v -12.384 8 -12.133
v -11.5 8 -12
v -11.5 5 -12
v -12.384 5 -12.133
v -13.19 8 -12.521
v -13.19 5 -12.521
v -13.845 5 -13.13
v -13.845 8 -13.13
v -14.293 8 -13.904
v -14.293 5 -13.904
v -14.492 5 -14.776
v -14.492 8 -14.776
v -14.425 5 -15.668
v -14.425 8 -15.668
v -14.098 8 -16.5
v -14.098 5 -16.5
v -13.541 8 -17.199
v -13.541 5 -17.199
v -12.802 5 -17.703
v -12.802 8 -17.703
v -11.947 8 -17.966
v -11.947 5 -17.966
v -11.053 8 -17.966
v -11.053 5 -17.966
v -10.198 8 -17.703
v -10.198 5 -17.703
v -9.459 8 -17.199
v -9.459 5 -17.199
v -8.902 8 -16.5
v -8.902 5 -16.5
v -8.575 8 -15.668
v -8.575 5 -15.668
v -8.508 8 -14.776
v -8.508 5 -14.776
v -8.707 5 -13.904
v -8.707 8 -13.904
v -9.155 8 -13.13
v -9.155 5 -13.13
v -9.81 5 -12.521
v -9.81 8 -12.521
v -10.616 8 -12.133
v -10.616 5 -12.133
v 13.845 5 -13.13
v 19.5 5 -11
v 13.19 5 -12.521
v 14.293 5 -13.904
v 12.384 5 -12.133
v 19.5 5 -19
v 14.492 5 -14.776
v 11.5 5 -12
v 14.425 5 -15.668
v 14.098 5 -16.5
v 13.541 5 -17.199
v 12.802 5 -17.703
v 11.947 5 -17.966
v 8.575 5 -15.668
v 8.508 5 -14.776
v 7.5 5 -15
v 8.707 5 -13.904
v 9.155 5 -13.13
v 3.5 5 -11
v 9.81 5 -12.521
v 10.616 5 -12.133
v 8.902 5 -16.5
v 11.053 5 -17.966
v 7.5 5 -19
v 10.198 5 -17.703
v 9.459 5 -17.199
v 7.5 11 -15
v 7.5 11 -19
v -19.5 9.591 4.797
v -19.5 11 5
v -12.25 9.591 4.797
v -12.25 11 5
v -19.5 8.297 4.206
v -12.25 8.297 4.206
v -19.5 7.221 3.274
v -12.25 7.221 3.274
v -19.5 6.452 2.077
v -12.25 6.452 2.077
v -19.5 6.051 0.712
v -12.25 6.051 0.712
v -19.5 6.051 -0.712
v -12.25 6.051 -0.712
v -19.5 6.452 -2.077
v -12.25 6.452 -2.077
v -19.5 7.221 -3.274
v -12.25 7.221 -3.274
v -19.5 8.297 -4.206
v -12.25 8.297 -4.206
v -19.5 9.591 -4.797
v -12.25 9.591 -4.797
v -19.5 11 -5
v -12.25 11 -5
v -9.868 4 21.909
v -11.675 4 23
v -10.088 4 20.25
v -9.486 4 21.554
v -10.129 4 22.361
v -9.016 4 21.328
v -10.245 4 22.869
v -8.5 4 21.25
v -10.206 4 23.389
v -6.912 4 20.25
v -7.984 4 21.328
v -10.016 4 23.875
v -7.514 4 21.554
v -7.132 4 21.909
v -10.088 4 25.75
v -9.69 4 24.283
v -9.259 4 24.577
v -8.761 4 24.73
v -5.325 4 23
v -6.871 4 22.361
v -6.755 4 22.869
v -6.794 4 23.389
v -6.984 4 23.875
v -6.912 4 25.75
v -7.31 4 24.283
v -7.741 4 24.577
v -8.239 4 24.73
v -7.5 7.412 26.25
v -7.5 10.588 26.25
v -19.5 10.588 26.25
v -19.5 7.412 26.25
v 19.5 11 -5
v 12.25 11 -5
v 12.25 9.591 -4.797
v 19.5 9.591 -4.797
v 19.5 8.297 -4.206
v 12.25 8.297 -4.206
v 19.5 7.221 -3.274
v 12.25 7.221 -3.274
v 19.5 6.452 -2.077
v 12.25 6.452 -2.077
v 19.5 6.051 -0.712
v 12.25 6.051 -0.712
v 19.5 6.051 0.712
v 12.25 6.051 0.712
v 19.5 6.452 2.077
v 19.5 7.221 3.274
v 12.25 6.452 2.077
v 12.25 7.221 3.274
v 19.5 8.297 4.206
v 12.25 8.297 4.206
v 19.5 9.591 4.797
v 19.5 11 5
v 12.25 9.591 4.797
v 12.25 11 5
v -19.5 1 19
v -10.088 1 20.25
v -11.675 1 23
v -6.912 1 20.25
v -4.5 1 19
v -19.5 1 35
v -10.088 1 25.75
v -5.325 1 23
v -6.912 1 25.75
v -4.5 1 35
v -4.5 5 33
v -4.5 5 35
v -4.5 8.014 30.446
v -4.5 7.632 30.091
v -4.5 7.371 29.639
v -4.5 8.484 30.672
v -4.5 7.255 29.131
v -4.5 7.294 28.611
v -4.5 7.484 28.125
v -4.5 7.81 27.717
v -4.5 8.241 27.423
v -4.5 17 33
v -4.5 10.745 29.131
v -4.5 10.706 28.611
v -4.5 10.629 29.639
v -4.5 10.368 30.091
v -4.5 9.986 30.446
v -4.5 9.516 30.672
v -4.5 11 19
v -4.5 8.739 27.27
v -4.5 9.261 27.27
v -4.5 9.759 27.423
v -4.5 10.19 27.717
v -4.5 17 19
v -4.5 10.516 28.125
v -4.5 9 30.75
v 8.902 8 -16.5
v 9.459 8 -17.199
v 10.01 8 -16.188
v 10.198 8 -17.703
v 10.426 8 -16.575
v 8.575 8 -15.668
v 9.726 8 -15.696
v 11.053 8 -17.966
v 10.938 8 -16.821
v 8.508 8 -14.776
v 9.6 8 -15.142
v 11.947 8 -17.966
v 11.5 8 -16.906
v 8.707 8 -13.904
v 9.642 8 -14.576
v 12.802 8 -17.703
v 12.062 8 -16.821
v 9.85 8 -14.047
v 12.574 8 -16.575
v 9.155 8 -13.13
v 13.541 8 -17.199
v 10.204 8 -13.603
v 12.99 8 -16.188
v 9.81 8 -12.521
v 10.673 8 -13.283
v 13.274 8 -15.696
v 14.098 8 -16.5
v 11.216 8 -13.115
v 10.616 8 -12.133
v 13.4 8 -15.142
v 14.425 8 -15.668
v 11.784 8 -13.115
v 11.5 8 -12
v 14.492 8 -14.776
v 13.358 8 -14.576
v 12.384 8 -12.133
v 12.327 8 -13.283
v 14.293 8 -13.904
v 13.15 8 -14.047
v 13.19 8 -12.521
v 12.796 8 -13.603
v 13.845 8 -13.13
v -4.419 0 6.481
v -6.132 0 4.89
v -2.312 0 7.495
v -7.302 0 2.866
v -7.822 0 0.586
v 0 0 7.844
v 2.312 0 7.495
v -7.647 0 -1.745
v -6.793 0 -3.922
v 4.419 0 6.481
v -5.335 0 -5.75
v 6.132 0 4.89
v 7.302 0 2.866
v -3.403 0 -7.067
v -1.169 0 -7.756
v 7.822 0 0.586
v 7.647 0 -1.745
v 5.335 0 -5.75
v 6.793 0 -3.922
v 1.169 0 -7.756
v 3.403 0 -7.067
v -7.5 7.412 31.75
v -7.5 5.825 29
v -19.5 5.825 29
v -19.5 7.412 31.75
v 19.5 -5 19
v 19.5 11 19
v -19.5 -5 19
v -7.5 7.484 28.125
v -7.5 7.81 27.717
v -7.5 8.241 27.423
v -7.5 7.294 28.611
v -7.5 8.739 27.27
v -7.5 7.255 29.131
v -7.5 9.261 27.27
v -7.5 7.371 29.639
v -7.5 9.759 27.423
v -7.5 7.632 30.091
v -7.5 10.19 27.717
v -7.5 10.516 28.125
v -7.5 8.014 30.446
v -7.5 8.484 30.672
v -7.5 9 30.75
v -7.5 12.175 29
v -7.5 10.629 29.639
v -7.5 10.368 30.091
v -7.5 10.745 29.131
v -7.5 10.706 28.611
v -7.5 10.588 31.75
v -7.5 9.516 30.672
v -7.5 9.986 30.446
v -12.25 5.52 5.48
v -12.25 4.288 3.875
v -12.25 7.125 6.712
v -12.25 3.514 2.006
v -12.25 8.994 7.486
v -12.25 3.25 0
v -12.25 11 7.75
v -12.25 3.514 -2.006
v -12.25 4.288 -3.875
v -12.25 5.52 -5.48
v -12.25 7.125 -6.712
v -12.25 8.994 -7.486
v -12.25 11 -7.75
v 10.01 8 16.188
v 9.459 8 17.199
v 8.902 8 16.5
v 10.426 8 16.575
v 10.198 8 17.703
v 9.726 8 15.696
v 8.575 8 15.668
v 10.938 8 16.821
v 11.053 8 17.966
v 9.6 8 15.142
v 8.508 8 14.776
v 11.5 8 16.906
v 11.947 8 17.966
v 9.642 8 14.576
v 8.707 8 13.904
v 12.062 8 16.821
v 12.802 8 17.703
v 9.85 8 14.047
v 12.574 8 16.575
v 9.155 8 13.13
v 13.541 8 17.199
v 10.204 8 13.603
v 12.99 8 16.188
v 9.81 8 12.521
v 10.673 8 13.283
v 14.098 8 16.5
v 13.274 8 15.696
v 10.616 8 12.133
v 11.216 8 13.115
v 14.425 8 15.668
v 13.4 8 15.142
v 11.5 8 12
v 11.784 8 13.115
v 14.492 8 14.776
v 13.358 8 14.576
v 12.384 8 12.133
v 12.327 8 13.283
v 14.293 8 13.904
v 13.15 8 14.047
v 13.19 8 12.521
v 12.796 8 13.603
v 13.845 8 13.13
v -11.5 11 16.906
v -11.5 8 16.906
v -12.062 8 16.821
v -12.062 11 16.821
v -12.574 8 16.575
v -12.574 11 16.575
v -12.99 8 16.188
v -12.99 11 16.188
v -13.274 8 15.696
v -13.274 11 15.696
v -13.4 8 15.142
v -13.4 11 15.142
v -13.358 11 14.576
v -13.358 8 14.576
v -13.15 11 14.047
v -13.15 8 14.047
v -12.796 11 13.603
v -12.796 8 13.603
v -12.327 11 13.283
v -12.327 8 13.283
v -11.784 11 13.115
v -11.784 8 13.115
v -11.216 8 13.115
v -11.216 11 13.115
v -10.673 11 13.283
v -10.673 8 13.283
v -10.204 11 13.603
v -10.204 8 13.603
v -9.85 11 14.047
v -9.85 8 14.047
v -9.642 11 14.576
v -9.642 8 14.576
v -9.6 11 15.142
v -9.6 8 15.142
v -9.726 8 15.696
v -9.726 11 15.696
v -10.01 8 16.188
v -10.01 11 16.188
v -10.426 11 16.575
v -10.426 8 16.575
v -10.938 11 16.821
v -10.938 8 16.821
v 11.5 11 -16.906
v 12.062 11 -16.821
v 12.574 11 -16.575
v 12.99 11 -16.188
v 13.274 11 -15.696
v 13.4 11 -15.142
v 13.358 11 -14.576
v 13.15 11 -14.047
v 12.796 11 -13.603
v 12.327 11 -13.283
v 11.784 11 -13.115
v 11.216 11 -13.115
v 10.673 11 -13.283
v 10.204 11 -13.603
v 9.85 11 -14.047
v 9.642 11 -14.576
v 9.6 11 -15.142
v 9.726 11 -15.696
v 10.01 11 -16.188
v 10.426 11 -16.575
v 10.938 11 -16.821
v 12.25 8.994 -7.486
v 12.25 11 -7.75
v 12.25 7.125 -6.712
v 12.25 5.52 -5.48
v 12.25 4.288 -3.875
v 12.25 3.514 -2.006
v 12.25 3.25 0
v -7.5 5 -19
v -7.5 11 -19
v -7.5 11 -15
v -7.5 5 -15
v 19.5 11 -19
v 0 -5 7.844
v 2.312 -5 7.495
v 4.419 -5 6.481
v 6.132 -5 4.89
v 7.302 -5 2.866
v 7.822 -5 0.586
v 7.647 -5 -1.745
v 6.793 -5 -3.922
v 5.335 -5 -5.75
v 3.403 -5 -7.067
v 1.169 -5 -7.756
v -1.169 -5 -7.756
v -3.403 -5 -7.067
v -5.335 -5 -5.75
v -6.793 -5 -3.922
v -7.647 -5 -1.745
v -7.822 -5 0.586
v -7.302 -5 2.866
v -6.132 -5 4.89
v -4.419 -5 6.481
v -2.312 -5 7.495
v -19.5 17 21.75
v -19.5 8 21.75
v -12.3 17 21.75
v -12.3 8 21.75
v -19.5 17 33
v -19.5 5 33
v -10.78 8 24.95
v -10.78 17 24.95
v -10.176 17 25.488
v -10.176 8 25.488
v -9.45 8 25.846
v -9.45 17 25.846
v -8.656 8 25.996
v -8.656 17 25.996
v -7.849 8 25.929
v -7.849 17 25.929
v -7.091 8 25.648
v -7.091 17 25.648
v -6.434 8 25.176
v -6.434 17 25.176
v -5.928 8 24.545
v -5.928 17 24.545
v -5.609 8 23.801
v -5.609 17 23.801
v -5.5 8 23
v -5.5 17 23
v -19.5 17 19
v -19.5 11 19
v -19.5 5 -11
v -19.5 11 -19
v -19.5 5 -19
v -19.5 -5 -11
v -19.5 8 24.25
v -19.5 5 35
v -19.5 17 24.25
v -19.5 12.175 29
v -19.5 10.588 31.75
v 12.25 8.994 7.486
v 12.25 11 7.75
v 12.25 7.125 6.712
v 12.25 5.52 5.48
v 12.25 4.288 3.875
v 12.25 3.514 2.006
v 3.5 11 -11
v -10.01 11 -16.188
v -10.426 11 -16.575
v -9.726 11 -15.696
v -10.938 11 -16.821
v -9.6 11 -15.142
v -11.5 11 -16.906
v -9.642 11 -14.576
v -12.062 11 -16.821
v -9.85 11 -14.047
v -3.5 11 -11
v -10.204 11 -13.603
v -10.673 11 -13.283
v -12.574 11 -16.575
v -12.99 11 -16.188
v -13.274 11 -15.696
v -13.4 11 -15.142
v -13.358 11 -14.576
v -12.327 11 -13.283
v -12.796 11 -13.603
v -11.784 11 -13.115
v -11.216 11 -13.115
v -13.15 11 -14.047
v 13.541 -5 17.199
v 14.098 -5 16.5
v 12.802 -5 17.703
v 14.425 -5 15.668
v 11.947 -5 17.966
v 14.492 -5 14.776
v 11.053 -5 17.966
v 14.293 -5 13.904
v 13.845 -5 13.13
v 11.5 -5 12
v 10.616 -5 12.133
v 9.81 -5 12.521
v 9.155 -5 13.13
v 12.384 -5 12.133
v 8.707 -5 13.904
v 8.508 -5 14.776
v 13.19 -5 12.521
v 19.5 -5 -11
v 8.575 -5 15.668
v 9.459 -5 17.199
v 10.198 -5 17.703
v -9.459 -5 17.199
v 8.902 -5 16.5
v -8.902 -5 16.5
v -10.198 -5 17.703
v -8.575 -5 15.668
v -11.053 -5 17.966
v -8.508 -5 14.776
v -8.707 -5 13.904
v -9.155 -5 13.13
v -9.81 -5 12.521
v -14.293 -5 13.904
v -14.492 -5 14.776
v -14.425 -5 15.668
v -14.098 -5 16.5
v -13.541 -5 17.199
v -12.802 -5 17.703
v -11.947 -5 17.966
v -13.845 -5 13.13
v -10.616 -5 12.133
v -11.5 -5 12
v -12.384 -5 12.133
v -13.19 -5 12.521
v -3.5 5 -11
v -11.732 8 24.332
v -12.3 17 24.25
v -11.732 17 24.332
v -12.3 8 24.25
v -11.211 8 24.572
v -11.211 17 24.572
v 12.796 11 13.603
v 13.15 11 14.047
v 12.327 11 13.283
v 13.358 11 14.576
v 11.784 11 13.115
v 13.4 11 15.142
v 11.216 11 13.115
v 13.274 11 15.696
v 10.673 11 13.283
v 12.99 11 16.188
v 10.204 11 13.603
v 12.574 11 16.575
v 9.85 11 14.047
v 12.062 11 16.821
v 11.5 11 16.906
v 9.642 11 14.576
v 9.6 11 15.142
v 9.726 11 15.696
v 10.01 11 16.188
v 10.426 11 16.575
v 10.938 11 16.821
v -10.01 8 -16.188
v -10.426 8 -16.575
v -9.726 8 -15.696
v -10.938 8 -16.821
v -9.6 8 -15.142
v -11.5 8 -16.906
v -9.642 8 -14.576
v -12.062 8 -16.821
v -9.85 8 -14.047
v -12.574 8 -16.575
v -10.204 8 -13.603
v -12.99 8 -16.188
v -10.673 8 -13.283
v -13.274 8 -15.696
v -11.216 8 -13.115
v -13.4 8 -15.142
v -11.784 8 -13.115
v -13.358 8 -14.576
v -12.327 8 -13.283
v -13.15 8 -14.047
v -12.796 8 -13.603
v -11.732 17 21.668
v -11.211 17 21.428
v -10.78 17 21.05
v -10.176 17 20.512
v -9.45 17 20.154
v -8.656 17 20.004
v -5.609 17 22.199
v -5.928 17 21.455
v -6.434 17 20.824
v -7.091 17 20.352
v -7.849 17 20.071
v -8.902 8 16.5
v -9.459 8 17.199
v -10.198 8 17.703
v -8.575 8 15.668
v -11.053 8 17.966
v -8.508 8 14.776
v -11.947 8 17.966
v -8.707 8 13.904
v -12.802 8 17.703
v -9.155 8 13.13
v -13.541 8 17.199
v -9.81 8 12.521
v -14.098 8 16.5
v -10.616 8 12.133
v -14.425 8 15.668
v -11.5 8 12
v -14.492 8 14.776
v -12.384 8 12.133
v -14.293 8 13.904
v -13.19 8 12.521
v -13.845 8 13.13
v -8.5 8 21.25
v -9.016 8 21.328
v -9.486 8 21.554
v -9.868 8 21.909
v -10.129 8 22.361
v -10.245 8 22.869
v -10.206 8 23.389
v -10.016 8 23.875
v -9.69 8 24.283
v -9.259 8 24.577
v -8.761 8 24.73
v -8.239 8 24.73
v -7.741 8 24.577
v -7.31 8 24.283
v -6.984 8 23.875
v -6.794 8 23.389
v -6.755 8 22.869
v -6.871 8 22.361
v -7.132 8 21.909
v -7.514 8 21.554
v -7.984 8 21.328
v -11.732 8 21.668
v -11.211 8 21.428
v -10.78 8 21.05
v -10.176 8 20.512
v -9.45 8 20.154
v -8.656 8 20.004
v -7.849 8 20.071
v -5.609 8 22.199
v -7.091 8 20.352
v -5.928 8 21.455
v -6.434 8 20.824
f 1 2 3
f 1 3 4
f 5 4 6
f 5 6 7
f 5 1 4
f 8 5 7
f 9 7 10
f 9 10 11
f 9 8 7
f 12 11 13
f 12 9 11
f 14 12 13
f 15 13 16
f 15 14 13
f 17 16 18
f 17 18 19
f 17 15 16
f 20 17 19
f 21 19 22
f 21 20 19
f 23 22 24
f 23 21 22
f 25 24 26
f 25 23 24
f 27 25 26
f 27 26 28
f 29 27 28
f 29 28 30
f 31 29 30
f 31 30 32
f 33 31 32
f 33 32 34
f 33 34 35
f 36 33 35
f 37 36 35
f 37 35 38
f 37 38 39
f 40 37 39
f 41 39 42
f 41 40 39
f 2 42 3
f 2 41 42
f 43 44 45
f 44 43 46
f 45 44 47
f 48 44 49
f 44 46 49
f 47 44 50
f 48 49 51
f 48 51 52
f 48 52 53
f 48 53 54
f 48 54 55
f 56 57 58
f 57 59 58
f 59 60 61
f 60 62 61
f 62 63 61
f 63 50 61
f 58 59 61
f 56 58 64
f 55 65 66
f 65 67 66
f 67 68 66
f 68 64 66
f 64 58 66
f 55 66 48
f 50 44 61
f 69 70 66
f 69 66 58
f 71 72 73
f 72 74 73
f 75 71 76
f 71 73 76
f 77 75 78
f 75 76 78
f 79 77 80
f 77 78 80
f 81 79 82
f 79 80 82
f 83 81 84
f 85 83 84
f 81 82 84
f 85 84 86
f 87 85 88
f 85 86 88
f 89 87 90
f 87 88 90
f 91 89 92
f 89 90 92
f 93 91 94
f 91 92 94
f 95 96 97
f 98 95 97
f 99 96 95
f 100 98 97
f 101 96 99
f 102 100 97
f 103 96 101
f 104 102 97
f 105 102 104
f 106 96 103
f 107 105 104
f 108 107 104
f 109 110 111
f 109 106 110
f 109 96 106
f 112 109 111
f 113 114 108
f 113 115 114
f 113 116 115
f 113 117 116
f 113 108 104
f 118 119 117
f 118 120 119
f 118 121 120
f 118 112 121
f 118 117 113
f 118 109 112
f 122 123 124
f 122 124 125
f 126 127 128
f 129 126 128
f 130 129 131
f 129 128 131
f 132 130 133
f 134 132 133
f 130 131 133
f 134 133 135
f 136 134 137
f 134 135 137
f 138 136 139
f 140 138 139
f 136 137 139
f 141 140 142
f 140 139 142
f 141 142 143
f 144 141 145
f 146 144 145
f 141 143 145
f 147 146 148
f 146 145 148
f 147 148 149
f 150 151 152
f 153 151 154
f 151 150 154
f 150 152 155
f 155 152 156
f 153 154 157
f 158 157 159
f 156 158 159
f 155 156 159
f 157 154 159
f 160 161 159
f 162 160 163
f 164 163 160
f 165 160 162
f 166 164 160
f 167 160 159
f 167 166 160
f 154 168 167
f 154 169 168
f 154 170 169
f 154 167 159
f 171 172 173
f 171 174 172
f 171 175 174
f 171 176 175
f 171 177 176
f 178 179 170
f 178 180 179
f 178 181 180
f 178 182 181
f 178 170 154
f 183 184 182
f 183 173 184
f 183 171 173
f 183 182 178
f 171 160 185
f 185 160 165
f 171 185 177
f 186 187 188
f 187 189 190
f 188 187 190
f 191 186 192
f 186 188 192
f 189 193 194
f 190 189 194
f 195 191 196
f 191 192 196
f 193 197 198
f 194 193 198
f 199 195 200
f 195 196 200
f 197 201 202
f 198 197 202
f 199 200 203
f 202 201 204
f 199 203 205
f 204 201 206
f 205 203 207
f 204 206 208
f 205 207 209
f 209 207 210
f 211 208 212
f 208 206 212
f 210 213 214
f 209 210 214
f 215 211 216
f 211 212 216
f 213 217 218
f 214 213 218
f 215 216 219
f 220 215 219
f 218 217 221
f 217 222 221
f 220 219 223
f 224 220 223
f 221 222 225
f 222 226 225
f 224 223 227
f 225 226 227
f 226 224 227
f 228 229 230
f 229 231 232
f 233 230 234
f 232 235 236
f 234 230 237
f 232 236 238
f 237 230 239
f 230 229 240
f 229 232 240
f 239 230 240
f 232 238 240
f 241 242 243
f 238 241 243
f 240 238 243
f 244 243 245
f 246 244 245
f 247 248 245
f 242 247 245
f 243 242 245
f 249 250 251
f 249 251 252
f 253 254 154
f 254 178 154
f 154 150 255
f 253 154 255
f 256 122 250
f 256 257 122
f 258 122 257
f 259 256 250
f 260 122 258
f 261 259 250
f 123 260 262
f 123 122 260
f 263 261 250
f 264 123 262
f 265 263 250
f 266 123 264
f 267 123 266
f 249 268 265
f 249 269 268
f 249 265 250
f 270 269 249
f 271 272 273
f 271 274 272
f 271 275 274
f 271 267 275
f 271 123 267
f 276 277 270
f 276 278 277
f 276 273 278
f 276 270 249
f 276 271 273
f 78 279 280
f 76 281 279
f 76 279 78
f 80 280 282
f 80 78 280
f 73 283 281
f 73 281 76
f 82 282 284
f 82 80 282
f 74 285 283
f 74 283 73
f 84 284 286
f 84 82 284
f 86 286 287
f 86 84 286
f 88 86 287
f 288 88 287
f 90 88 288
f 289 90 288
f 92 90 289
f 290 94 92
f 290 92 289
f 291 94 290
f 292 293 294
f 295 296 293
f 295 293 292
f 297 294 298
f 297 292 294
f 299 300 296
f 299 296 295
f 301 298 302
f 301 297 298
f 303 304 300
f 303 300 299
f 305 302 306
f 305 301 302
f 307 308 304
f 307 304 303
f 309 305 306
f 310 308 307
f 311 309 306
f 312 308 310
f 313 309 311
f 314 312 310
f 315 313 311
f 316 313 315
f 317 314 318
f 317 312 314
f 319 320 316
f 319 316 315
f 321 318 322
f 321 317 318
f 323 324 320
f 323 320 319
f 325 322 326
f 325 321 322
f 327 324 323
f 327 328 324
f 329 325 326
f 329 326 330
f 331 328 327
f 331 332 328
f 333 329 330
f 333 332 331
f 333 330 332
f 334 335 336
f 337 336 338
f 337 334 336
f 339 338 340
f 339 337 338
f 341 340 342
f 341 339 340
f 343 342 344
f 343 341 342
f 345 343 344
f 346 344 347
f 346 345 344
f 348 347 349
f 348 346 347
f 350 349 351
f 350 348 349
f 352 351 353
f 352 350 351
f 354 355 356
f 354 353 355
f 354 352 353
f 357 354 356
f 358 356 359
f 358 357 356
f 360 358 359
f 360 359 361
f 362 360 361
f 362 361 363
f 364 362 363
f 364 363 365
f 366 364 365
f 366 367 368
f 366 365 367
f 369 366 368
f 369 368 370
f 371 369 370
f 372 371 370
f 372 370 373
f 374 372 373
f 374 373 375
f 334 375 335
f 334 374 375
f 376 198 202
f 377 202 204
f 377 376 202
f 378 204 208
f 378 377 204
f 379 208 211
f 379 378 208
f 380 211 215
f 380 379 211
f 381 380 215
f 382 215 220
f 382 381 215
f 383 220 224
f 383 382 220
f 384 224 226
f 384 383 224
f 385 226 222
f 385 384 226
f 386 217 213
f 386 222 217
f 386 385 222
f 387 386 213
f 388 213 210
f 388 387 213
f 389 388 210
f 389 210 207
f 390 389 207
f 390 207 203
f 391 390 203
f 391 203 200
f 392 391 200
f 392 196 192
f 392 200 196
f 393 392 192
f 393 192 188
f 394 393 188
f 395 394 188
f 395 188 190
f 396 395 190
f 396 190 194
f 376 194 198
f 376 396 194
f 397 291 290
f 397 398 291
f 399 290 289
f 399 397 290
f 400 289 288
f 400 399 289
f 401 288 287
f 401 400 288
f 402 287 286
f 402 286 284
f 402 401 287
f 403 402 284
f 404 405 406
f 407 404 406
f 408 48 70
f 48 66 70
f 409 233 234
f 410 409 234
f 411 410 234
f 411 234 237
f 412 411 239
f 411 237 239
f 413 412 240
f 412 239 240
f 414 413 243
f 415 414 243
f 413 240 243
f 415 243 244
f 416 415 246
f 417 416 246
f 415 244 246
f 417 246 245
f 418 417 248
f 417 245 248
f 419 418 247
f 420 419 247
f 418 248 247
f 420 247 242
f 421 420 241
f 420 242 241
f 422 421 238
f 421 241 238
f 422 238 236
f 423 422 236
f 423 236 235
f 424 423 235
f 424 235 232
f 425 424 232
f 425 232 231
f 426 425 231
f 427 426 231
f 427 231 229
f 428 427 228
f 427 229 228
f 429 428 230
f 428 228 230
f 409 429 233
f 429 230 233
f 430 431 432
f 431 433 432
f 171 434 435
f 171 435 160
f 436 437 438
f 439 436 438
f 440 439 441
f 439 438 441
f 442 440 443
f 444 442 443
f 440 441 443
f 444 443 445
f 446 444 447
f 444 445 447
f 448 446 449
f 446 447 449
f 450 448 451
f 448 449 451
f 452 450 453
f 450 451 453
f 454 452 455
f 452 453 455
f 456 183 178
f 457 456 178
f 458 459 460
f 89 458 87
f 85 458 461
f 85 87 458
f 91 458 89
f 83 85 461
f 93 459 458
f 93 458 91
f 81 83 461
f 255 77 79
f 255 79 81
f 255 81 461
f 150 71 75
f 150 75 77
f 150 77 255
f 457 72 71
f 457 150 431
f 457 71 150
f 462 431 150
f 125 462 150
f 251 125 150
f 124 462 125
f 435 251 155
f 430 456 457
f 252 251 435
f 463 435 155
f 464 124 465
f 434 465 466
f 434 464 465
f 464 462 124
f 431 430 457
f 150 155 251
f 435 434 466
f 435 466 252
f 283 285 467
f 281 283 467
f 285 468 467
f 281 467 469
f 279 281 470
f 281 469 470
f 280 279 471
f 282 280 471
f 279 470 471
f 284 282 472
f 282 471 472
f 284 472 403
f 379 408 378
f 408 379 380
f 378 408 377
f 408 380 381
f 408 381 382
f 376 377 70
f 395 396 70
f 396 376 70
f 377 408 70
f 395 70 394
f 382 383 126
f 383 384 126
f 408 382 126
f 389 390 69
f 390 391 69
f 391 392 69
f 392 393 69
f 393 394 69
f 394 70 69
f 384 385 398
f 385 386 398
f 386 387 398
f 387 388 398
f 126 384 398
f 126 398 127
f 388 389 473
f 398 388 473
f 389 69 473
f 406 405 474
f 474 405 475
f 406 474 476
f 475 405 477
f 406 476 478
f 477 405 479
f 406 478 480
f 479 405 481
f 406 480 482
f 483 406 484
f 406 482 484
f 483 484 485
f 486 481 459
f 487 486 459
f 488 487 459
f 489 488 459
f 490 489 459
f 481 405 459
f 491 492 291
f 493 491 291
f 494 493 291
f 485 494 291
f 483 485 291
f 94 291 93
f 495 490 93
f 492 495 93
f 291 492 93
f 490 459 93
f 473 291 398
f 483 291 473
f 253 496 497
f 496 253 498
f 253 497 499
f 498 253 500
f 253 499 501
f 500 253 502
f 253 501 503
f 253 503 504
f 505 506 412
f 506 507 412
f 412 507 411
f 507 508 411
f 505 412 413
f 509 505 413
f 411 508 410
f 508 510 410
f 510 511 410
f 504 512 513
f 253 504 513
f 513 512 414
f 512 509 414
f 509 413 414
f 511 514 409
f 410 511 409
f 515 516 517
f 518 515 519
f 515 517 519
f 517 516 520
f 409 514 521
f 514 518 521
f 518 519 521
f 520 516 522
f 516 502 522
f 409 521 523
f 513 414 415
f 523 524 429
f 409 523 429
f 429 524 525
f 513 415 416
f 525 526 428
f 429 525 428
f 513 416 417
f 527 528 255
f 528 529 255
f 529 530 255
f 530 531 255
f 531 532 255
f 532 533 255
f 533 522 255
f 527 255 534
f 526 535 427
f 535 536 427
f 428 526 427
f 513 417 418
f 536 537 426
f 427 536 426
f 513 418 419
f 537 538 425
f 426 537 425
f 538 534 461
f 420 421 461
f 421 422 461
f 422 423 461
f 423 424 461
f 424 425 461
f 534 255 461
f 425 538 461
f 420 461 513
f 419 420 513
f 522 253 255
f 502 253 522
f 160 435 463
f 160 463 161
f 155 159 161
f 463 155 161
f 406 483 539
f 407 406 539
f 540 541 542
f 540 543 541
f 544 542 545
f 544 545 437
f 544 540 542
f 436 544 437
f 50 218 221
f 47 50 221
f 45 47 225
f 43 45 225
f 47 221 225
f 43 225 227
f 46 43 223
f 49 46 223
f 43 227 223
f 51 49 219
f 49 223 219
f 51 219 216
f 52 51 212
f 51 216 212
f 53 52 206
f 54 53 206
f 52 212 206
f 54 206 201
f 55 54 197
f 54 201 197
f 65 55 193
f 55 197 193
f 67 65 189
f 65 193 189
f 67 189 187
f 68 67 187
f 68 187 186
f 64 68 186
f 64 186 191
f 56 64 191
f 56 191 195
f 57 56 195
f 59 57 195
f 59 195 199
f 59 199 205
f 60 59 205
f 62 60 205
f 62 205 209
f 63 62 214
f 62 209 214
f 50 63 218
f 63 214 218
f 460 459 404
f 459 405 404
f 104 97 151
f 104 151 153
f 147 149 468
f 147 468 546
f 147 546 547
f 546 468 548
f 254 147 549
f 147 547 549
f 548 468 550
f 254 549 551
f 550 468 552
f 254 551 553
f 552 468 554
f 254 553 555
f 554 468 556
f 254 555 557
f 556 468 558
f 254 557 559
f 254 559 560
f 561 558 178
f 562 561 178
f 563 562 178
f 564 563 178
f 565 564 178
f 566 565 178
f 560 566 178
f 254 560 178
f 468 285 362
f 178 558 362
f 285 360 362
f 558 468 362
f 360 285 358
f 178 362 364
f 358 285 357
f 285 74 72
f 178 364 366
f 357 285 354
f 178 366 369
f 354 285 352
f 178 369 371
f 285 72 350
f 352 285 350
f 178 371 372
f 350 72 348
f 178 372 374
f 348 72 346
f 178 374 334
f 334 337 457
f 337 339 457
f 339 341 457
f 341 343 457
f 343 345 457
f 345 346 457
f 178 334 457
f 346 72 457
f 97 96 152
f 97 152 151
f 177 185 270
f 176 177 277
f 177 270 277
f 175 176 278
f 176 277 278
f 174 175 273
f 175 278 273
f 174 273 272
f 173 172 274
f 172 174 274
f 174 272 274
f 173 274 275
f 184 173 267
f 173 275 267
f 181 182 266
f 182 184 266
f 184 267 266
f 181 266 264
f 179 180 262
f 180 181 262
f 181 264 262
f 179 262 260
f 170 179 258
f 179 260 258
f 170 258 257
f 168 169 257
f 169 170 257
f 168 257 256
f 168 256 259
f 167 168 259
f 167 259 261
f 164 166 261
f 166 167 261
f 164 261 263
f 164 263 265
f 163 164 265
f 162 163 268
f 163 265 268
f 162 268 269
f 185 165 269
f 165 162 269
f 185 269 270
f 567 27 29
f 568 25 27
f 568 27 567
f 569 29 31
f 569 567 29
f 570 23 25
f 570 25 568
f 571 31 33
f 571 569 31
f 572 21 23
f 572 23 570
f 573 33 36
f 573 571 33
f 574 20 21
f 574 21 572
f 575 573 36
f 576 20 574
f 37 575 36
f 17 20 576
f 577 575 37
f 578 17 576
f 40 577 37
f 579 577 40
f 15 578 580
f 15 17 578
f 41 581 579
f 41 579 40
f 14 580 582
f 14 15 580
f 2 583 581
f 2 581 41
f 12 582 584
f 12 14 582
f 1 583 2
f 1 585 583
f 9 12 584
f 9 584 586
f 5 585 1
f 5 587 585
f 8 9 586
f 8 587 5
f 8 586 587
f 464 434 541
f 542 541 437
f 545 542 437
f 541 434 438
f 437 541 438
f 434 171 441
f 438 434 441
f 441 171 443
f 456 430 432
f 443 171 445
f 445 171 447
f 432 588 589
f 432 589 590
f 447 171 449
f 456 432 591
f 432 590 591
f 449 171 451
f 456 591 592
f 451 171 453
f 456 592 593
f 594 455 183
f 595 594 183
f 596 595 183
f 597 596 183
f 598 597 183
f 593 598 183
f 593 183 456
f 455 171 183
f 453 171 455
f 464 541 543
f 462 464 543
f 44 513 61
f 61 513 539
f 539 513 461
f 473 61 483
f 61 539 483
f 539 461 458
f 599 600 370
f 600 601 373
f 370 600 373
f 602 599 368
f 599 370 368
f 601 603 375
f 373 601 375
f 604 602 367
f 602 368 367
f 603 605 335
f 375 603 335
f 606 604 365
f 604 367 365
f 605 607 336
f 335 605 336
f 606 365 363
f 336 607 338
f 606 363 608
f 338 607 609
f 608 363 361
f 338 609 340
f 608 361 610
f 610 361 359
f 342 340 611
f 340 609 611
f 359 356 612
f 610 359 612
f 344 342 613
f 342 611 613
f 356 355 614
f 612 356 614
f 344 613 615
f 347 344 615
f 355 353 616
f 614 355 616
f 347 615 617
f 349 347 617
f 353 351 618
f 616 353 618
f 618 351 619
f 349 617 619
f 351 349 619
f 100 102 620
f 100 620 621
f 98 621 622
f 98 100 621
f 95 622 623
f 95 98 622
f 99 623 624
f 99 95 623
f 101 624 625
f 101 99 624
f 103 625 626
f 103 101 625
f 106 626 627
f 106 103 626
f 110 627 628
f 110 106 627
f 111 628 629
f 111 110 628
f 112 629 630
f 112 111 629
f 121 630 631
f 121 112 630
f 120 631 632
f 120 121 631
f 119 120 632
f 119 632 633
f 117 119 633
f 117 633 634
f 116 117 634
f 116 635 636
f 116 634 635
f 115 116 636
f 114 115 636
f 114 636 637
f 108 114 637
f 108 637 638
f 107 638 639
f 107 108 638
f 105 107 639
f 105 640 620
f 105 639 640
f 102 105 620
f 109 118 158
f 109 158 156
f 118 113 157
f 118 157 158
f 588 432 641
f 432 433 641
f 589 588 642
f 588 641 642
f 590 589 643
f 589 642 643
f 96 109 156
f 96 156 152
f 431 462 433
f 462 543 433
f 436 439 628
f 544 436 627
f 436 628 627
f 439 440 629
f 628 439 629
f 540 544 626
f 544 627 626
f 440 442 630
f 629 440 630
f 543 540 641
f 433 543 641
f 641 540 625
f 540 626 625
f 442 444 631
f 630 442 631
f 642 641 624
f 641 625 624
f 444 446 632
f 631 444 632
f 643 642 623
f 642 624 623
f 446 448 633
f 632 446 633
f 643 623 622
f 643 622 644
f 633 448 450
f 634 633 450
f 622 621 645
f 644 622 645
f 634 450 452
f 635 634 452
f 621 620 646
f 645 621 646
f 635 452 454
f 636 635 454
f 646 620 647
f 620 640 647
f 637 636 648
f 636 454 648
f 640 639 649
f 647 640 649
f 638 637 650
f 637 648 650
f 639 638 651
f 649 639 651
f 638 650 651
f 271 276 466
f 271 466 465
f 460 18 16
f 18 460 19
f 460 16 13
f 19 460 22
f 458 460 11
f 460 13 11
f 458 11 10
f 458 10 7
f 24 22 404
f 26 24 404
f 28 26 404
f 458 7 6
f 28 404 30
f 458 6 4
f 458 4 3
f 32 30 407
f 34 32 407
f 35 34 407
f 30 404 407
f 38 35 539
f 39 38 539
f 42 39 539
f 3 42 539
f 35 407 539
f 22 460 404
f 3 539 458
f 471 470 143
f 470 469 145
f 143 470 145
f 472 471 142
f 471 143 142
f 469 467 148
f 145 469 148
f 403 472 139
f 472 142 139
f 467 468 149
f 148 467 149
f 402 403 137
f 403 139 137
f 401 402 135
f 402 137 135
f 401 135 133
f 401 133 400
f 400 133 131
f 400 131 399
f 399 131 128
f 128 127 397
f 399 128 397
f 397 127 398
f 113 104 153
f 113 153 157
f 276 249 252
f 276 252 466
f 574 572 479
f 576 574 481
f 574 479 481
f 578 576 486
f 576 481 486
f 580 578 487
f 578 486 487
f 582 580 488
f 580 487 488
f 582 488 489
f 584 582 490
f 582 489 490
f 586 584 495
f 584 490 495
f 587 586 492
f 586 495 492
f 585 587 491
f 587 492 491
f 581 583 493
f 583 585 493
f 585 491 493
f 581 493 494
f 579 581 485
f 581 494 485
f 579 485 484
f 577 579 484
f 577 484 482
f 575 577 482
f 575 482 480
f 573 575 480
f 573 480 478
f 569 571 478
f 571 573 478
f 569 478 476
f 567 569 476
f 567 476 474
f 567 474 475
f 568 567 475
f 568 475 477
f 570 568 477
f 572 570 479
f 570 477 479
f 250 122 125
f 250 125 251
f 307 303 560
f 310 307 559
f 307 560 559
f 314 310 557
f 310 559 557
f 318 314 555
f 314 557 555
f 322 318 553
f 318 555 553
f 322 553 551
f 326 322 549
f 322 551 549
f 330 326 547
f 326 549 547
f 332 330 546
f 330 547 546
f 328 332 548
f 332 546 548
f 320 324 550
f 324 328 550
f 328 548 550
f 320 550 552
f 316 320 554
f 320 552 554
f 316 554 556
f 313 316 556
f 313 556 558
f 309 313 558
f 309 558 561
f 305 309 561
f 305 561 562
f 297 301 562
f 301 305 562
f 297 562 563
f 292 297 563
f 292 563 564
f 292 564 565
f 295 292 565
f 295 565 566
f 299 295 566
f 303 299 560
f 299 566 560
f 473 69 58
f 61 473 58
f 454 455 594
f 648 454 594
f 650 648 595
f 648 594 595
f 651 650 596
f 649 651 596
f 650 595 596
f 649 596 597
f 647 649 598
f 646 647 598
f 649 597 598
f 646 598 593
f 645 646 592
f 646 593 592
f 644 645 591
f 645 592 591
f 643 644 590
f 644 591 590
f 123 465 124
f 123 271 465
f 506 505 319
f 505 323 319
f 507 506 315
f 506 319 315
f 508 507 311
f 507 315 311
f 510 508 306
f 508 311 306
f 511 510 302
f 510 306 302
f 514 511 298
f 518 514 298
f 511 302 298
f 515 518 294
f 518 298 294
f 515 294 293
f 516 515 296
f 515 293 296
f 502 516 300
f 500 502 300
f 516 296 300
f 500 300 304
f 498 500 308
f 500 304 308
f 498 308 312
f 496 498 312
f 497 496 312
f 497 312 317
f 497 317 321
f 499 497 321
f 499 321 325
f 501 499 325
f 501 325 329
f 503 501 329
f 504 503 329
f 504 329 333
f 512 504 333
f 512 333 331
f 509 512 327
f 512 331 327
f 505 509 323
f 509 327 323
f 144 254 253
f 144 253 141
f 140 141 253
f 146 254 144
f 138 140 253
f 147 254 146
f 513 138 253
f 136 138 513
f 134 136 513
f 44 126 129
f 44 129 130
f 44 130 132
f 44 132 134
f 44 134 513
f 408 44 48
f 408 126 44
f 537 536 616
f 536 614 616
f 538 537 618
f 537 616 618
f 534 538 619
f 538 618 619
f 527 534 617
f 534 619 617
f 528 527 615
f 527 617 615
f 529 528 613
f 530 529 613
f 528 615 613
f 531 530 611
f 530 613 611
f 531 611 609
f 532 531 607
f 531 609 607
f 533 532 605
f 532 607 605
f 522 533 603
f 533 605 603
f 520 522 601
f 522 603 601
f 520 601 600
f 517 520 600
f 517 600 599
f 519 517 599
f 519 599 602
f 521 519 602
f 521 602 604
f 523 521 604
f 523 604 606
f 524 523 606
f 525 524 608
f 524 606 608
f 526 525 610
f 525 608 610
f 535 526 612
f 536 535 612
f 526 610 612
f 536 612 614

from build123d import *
from build123d.topology import SkipClean

# Parameters (mm, degrees)
SKETCH1_W                 = 31
SKETCH1_H                 = 22
BOSS_EXTRUDE1_DEPTH       = 11
SKETCH2_W                 = 31
SKETCH2_H                 = 22
SKETCH2_R                 = 7.843750423
BOSS_EXTRUDE2_DEPTH       = 5
SKETCH3_W                 = 24.5
SKETCH3_H                 = 15.5
CUT_EXTRUDE1_DEPTH        = 7.75
FILLET1_R                 = 7.75
CUT_EXTRUDE2_DEPTH        = 32.812929761
CUT_EXTRUDE2_DEPTH_BACK   = 32.812929761
SKETCH4_R                 = 5
SKETCH5_W                 = 8
SKETCH5_H                 = 8
SKETCH5_R                 = 1.905800151
BOSS_EXTRUDE3_DEPTH       = 6
CUT_EXTRUDE3_START        = -3
SKETCH6_R                 = 3
SKETCH6_R_2               = 1.905800151
CUT_EXTRUDE3_DEPTH        = 3
MIRROR9_COPY_1_SKETCH_W   = 8
MIRROR9_COPY_1_SKETCH_H   = 8
MIRROR9_COPY_1_SKETCH_R   = 1.905800151
MIRROR9_COPY_1_DEPTH      = 6
MIRROR9_START             = -3
MIRROR9_COPY_2_SKETCH_R   = 3
MIRROR9_COPY_2_SKETCH_R_2 = 1.905800151
MIRROR9_COPY_2_DEPTH      = 3
CHAMFER2_SIZE             = 4
SKETCH8_R                 = 3
BOSS_EXTRUDE4_DEPTH       = 16
SKETCH9_R                 = 1.75
BOSS_EXTRUDE5_DEPTH       = 16
CUT_EXTRUDE6_DEPTH        = 9
SKETCH11_R                = 1.75
CUT_EXTRUDE7_DEPTH        = 8
FILLET2_R                 = 2
CUT_EXTRUDE8_DEPTH        = 41.425858061
CUT_EXTRUDE8_DEPTH_BACK   = 41.425858061
SKETCH12_R                = 1.75
CUT_EXTRUDE9_START        = -3
SKETCH13_R                = 1.75
CUT_EXTRUDE9_DEPTH        = 3
BOSS_EXTRUDE8_DEPTH       = 4
BOSS_EXTRUDE9_DEPTH       = 4
CUT_EXTRUDE11_START       = -5
SKETCH18_R                = 1.75
CUT_EXTRUDE11_DEPTH       = 5
SKETCH20_W                = 15
SKETCH20_H                = 2
CUT_EXTRUDE12_DEPTH       = 12


with BuildPart() as part:
    # Sketch1 → Boss-Extrude1 (new body)
    with BuildSketch(Plane(origin=(0, 0, 0), x_dir=(1, 0, 0), z_dir=(0, 1, 0))):
        Rectangle(SKETCH1_W, SKETCH1_H)
    extrude(amount=BOSS_EXTRUDE1_DEPTH)

    # Sketch2 → Boss-Extrude2 (add)
    with BuildSketch(Plane(origin=(0, 0, 0), x_dir=(1, 0, 0), z_dir=(0, 1, 0))):
        Rectangle(SKETCH2_W, SKETCH2_H)
        with Locations(Location((0, 0, 0), (0, 0, 270))):
            Circle(SKETCH2_R, mode=Mode.SUBTRACT)
    extrude(amount=-BOSS_EXTRUDE2_DEPTH)

    # Sketch3 → Cut-Extrude1 (cut)
    with BuildSketch(Plane(origin=(0, 11, 0), x_dir=(1, 0, 0), z_dir=(0, 1, 0))):
        Rectangle(SKETCH3_W, SKETCH3_H)
    extrude(amount=-CUT_EXTRUDE1_DEPTH, mode=Mode.SUBTRACT)

    # Fillet1
    fillet1_edges = [part.edges().sort_by_distance(p)[0] for p in [
        (0, 3.25, 7.75),
        (0, 3.25, -7.75),
    ]]
    fillet(fillet1_edges, radius=FILLET1_R - 0.0001)  # a hair under: the kernel refuses the full size

    # Sketch4 → Cut-Extrude2 (cut, two sides: drawn at the far end of the back side and taken through both)
    with BuildSketch(Plane(origin=(-12.25, 0, 0), x_dir=(0, 0, -1), z_dir=(1, 0, 0)).offset(-CUT_EXTRUDE2_DEPTH_BACK)):
        with Locations((0, 11)):
            Circle(SKETCH4_R)
    extrude(amount=CUT_EXTRUDE2_DEPTH + CUT_EXTRUDE2_DEPTH_BACK, mode=Mode.SUBTRACT)

    # Sketch5 → Boss-Extrude3 (add)
    with BuildSketch(Plane(origin=(0, 11, 0), x_dir=(1, 0, 0), z_dir=(0, 1, 0))):
        with Locations((11.5, -15)):
            Rectangle(SKETCH5_W, SKETCH5_H)
        with Locations(Location((11.5, -15, 0), (0, 0, 270))):
            Circle(SKETCH5_R, mode=Mode.SUBTRACT)
    boss_extrude3 = extrude(amount=-BOSS_EXTRUDE3_DEPTH)

    # Sketch6 → Cut-Extrude3 (cut)
    with BuildSketch(Plane.XZ.offset(-5).offset(CUT_EXTRUDE3_START)):
        with Locations(Location((11.5, 15, 0), (0, 0, 270))):
            Circle(SKETCH6_R)
        with Locations(Location((11.5, 15, 0), (0, 0, 90))):
            Circle(SKETCH6_R_2, mode=Mode.SUBTRACT)
    cut_extrude3 = extrude(amount=CUT_EXTRUDE3_DEPTH, mode=Mode.SUBTRACT)

    # Mirror8: Boss-Extrude3, Cut-Extrude3 across plane
    add(boss_extrude3.mirror(Plane(origin=(0, 0, 0), x_dir=(0, 0, 1), z_dir=(1, 0, 0))))
    add(cut_extrude3.mirror(Plane(origin=(0, 0, 0), x_dir=(0, 0, 1), z_dir=(1, 0, 0))), mode=Mode.SUBTRACT)

    # Mirror9: Boss-Extrude3, Cut-Extrude3 across plane
    add(boss_extrude3.mirror(Plane.XY))
    add(cut_extrude3.mirror(Plane.XY), mode=Mode.SUBTRACT)

    # Mirror9 copy 1 sketch → Mirror9 copy 1 (add)
    with BuildSketch(Plane(origin=(0, 11, 0), x_dir=(-1, 0, 0), z_dir=(0, 1, 0))):
        with Locations((11.5, -15)):
            Rectangle(MIRROR9_COPY_1_SKETCH_W, MIRROR9_COPY_1_SKETCH_H)
        with Locations(Location((11.5, -15, 0), (0, 0, 270))):
            Circle(MIRROR9_COPY_1_SKETCH_R, mode=Mode.SUBTRACT)
    extrude(amount=-MIRROR9_COPY_1_DEPTH)

    # Mirror9 copy 2 sketch → Mirror9 copy 2 (cut)
    with BuildSketch(Plane(origin=(0, 5, 0), x_dir=(-1, 0, 0), z_dir=(0, -1, 0)).offset(MIRROR9_START)):
        with Locations(Location((11.5, 15, 0), (0, 0, 270))):
            Circle(MIRROR9_COPY_2_SKETCH_R)
        with Locations(Location((11.5, 15, 0), (0, 0, 90))):
            Circle(MIRROR9_COPY_2_SKETCH_R_2, mode=Mode.SUBTRACT)
    extrude(amount=MIRROR9_COPY_2_DEPTH, mode=Mode.SUBTRACT)

    # Chamfer2
    chamfer2_edges = [part.edges().sort_by_distance(p)[0] for p in [
        (-7.5, 8, -11),
        (7.5, 8, -11),
        (7.5, 8, 11),
        (-7.5, 8, 11),
    ]]
    chamfer(chamfer2_edges, length=CHAMFER2_SIZE)

    # Sketch8 → Boss-Extrude4 (add)
    # profile 1 of 3: a face of its own
    with BuildSketch(Plane(origin=(0, 11, 0), x_dir=(1, 0, 0), z_dir=(0, 1, 0))):
        Polygon((3.5, -11), (-3.5, -11), (-7.5, -15), (-7.5, -19), (7.5, -19), (7.5, -15), align=None)
    # profile 2 of 3: a face of its own
    with BuildSketch(Plane(origin=(0, 11, 0), x_dir=(1, 0, 0), z_dir=(0, 1, 0))):
        Polygon((15.5, -11), (3.5, -11), (7.5, -15), (7.5, -19), (15.5, -19), align=None)
        with Locations(Location((11.5, -15, 0), (0, 0, 90))):
            Circle(SKETCH8_R, mode=Mode.SUBTRACT)
    # profile 3 of 3: a face of its own
    with BuildSketch(Plane(origin=(0, 11, 0), x_dir=(1, 0, 0), z_dir=(0, 1, 0))):
        Polygon((-3.5, -11), (-15.5, -11), (-15.5, -19), (-7.5, -19), (-7.5, -15), align=None)
        with Locations(Location((-11.5, -15, 0), (0, 0, 90))):
            Circle(SKETCH8_R, mode=Mode.SUBTRACT)
    extrude(amount=-BOSS_EXTRUDE4_DEPTH)

    # Sketch9 → Boss-Extrude5 (add)
    with BuildSketch(Plane.ZY.offset(15.5)):
        Polygon((19, 11), (19, 1), (35, 1), (35, 17), (19, 17), align=None)
        with Locations((29, 9)):
            Circle(SKETCH9_R, mode=Mode.SUBTRACT)
    extrude(amount=-BOSS_EXTRUDE5_DEPTH)

    # Sketch10 → Cut-Extrude6 (cut)
    with BuildSketch(Plane(origin=(0, 17, 0), x_dir=(1, 0, 0), z_dir=(0, 1, 0))):
        with BuildLine():
            ThreePointArc((-11.227178029, -24.25), (-11.5, -23), (-11.227178029, -21.75))
            Line((-11.227178029, -21.75), (-15.5, -21.75))
            Line((-15.5, -21.75), (-15.5, -24.25))
            Line((-15.5, -24.25), (-11.227178029, -24.25))
        make_face()
        with BuildLine():
            Line((-8.5, -24.25), (-8.5, -21.75))
            Line((-8.5, -21.75), (-11.227178029, -21.75))
            ThreePointArc((-11.227178029, -21.75), (-11.5, -23), (-11.227178029, -24.25))
            Line((-11.227178029, -24.25), (-8.5, -24.25))
        make_face()
        with BuildLine():
            Line((-11.227178029, -21.75), (-8.5, -21.75))
            Line((-8.5, -21.75), (-8.5, -24.25))
            Line((-8.5, -24.25), (-11.227178029, -24.25))
            ThreePointArc((-11.227178029, -24.25), (-7.860286817, -25.931001031), (-5.5, -23))
            ThreePointArc((-5.5, -23), (-7.860286817, -20.068998969), (-11.227178029, -21.75))
        make_face()
    extrude(amount=-CUT_EXTRUDE6_DEPTH, mode=Mode.SUBTRACT)

    # Sketch11 → Cut-Extrude7 (cut)
    with BuildSketch(Plane.ZY.offset(15.5)):
        Polygon((29, 12.175426481), (26.25, 10.58771324), (26.25, 7.41228676), (29, 5.824573519), (31.75, 7.41228676), (31.75, 10.58771324), align=None)
        with Locations((29, 9)):
            Circle(SKETCH11_R, mode=Mode.SUBTRACT)
    extrude(amount=-CUT_EXTRUDE7_DEPTH, mode=Mode.SUBTRACT)

    # Fillet2
    fillet2_edges = [part.edges().sort_by_distance(p)[0] for p in [
        (-11.227178029, 12.5, 21.75),
        (-11.227178029, 12.5, 24.25),
    ]]
    fillet(fillet2_edges, radius=FILLET2_R)

    # Sketch12 → Cut-Extrude8 (cut, two sides: drawn at the far end of the back side and taken through both)
    with BuildSketch(Plane(origin=(0, 8, 0), x_dir=(1, 0, 0), z_dir=(0, 1, 0)).offset(-CUT_EXTRUDE8_DEPTH_BACK)):
        with Locations(Location((-8.5, -23, 0), (0, 0, 90))):
            Circle(SKETCH12_R)
    extrude(amount=CUT_EXTRUDE8_DEPTH + CUT_EXTRUDE8_DEPTH_BACK, mode=Mode.SUBTRACT)

    # Sketch13 → Cut-Extrude9 (cut)
    with BuildSketch(Plane.XZ.offset(-1).offset(CUT_EXTRUDE9_START)):
        Polygon((-5.324573519, 23), (-6.91228676, 25.75), (-10.08771324, 25.75), (-11.675426481, 23), (-10.08771324, 20.25), (-6.91228676, 20.25), align=None)
        with Locations(Location((-8.5, 23, 0), (0, 0, 270))):
            Circle(SKETCH13_R, mode=Mode.SUBTRACT)
    extrude(amount=CUT_EXTRUDE9_DEPTH, mode=Mode.SUBTRACT)

    # Sketch15 → Boss-Extrude8 (add)
    with SkipClean():  # the faces are left unmerged after this step: merging them gives an invalid solid
        with BuildSketch(Plane.ZY.offset(15.5)):
            with BuildLine():
                Line((24.25, 17), (24.25, 8))
                Line((24.25, 8), (21.75, 8))
                Line((21.75, 8), (21.75, 17))
                Line((21.75, 17), (19, 17))
                Line((19, 17), (19, 11))
                Line((19, 11), (5, 11))
                ThreePointArc((5, 11), (0, 6), (-5, 11))
                Line((-5, 11), (-19, 11))
                Line((-19, 11), (-19, 5))
                Line((-19, 5), (-11, 5))
                Line((-11, 5), (-11, -5))
                Line((-11, -5), (19, -5))
                Line((19, -5), (19, 1))
                Line((19, 1), (35, 1))
                Line((35, 1), (35, 17))
                Line((35, 17), (24.25, 17))
            make_face()
            Polygon((29, 12.175426481), (26.25, 10.58771324), (26.25, 7.41228676), (29, 5.824573519), (31.75, 7.41228676), (31.75, 10.58771324), align=None, mode=Mode.SUBTRACT)
        extrude(amount=BOSS_EXTRUDE8_DEPTH)
    add(part.part.scale(1), mode=Mode.REPLACE)  # the faces are merged on a copy

    # Sketch17 → Boss-Extrude9 (add)
    with BuildSketch(Plane(origin=(15.5, 0, 0), x_dir=(0, 0, -1), z_dir=(1, 0, 0))):
        with BuildLine():
            Line((-5, 11), (-19, 11))
            Line((-19, 11), (-19, -5))
            Line((-19, -5), (11, -5))
            Line((11, -5), (11, 5))
            Line((11, 5), (19, 5))
            Line((19, 5), (19, 11))
            Line((19, 11), (5, 11))
            ThreePointArc((5, 11), (0, 6), (-5, 11))
        make_face()
    extrude(amount=BOSS_EXTRUDE9_DEPTH)

    # Sketch18 → Cut-Extrude11 (cut)
    with BuildSketch(Plane(origin=(0.5, 0, 0), x_dir=(0, 0, -1), z_dir=(1, 0, 0)).offset(CUT_EXTRUDE11_START)):
        Polygon((-35, 1), (-19, 1), (-19, 11), (-19, 17), (-35, 17), align=None)
        with Locations(Location((-29, 9, 0), (0, 0, 180))):
            Circle(SKETCH18_R, mode=Mode.SUBTRACT)
    extrude(amount=CUT_EXTRUDE11_DEPTH, mode=Mode.SUBTRACT)

    # Sketch20 → Cut-Extrude12 (cut)
    with BuildSketch(Plane(origin=(0, 17, 0), x_dir=(1, 0, 0), z_dir=(0, 1, 0))):
        with Locations((-12, -34)):
            Rectangle(SKETCH20_W, SKETCH20_H)
    extrude(amount=-CUT_EXTRUDE12_DEPTH, mode=Mode.SUBTRACT)


solid = part.part
